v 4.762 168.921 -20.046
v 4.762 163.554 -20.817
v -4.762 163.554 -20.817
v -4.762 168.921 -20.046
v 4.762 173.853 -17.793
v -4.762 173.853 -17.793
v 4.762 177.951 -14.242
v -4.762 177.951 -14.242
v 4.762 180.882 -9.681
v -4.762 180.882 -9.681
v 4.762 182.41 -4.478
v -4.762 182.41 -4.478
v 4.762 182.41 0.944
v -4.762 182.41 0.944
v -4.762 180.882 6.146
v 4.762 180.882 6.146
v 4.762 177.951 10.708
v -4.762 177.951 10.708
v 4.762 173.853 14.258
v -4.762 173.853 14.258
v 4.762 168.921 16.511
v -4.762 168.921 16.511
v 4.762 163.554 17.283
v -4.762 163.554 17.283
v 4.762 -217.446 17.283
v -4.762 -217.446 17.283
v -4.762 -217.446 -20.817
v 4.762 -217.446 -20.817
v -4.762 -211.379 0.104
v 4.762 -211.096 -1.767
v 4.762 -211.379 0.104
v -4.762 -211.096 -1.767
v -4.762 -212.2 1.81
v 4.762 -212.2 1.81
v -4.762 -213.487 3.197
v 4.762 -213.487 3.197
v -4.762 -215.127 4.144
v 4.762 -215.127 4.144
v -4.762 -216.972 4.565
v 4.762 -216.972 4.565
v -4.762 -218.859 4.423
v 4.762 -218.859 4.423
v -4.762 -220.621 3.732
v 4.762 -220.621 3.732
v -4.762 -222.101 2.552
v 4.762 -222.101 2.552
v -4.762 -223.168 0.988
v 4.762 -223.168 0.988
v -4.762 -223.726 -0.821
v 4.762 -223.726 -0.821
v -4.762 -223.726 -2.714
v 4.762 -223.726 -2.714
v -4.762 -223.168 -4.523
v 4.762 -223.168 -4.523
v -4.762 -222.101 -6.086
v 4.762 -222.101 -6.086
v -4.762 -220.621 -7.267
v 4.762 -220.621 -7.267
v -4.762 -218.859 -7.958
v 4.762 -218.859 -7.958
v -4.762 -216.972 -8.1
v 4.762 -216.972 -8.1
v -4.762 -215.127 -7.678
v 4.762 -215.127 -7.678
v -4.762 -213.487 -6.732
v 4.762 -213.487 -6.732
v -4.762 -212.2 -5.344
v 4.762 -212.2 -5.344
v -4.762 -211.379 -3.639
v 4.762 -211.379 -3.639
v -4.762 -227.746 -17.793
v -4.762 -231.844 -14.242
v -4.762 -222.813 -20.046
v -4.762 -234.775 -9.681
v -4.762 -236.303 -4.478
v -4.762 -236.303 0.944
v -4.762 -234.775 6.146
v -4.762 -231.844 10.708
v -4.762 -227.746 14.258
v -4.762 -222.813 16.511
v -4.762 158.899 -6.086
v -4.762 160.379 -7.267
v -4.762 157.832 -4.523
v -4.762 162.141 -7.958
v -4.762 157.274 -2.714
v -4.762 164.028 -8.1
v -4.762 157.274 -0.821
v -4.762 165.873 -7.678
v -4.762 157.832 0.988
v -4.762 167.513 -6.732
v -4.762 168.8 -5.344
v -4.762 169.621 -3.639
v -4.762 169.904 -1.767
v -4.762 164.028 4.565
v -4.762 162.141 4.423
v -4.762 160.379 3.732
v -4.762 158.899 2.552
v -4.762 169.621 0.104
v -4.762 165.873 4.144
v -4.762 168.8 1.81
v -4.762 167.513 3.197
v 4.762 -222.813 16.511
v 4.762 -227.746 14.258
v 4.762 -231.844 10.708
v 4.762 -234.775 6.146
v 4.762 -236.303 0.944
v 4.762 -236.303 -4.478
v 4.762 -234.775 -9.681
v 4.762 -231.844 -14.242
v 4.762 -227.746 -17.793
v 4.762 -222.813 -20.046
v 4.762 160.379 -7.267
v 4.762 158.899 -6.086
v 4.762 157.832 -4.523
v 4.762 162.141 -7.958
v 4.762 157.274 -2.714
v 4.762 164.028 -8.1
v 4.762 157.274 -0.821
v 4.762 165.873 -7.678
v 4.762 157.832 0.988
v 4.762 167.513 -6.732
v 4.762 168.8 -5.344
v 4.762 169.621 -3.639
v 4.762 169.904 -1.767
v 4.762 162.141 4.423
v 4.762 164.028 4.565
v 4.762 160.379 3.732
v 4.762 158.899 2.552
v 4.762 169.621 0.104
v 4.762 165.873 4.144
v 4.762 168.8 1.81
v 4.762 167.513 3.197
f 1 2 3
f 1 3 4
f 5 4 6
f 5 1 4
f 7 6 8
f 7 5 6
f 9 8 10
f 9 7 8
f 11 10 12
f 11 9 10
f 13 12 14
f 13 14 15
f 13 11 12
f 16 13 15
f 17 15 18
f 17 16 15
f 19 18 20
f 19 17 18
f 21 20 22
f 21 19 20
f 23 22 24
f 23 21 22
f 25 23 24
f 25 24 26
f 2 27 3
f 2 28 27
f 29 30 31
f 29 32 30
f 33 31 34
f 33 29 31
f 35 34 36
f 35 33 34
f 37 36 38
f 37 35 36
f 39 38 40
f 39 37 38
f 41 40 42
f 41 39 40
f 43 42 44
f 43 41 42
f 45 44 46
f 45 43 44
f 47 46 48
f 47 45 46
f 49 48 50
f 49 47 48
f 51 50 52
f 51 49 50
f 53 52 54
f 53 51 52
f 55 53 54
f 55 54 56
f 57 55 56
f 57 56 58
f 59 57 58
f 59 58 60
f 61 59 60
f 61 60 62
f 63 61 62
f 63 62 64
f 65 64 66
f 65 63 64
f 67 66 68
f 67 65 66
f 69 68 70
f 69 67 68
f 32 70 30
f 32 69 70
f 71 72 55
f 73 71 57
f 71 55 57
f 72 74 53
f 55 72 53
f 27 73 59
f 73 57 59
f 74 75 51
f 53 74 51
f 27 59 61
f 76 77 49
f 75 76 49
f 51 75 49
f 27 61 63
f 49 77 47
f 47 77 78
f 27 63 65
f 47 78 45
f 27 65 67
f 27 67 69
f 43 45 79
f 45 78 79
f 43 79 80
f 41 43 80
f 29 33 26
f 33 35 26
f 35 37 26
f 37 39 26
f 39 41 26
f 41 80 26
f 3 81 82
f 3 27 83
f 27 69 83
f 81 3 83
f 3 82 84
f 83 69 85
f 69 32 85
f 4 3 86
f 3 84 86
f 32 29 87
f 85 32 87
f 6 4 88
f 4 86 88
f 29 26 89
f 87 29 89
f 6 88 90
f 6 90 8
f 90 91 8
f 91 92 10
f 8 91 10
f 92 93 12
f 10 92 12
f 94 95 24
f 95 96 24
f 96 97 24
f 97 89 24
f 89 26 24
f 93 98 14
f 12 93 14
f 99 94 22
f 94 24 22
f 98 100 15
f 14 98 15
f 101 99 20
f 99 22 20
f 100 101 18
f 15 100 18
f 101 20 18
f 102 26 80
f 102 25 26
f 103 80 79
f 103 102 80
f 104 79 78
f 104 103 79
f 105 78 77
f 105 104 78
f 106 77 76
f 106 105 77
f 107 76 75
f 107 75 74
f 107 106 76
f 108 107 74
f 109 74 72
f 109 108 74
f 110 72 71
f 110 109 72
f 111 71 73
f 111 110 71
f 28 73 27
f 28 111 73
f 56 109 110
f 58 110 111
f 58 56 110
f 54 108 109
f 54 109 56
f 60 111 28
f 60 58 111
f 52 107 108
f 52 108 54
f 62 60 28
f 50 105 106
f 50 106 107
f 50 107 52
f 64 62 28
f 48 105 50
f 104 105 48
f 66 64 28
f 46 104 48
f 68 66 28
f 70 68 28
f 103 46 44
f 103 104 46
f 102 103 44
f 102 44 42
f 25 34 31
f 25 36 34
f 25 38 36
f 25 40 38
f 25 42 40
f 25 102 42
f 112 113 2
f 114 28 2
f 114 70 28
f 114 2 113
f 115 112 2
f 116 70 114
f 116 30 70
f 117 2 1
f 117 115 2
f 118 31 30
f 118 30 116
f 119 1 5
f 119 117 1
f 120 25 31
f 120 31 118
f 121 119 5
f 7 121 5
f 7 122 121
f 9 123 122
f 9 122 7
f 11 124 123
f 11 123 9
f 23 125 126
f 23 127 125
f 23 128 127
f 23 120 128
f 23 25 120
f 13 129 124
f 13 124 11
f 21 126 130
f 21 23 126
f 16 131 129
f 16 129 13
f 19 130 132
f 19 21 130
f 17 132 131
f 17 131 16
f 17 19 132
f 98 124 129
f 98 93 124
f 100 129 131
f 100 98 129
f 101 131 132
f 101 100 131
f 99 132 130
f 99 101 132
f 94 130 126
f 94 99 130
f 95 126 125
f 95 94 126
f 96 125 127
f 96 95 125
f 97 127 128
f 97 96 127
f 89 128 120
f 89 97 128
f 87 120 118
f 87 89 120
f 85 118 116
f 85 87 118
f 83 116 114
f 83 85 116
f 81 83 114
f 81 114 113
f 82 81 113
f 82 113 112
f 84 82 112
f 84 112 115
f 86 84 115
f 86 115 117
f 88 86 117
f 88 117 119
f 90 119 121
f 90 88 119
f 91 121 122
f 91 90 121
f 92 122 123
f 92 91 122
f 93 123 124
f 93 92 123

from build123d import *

# Parameters (mm, degrees)
F0_R     = 6.35
F1_DEPTH = 4.7625


with BuildPart() as f1:
    # F0 (on Right) → F1 (new body, symmetric)
    with BuildSketch(Plane.YZ):
        with BuildLine():
            Line((-217.446472, -20.817392), (163.553528, -20.817392))
            ThreePointArc((163.553528, -20.817392), (182.603528, -1.767392), (163.553528, 17.282608))
            Line((163.553528, 17.282608), (-217.446472, 17.282608))
            ThreePointArc((-217.446472, 17.282608), (-236.496472, -1.767392), (-217.446472, -20.817392))
        make_face()
        with Locations((-217.446472, -1.767392)):
            Circle(F0_R, mode=Mode.SUBTRACT)
        with Locations((163.553528, -1.767392)):
            Circle(F0_R, mode=Mode.SUBTRACT)
    extrude(amount=F1_DEPTH, both=True)


solid = f1.part
